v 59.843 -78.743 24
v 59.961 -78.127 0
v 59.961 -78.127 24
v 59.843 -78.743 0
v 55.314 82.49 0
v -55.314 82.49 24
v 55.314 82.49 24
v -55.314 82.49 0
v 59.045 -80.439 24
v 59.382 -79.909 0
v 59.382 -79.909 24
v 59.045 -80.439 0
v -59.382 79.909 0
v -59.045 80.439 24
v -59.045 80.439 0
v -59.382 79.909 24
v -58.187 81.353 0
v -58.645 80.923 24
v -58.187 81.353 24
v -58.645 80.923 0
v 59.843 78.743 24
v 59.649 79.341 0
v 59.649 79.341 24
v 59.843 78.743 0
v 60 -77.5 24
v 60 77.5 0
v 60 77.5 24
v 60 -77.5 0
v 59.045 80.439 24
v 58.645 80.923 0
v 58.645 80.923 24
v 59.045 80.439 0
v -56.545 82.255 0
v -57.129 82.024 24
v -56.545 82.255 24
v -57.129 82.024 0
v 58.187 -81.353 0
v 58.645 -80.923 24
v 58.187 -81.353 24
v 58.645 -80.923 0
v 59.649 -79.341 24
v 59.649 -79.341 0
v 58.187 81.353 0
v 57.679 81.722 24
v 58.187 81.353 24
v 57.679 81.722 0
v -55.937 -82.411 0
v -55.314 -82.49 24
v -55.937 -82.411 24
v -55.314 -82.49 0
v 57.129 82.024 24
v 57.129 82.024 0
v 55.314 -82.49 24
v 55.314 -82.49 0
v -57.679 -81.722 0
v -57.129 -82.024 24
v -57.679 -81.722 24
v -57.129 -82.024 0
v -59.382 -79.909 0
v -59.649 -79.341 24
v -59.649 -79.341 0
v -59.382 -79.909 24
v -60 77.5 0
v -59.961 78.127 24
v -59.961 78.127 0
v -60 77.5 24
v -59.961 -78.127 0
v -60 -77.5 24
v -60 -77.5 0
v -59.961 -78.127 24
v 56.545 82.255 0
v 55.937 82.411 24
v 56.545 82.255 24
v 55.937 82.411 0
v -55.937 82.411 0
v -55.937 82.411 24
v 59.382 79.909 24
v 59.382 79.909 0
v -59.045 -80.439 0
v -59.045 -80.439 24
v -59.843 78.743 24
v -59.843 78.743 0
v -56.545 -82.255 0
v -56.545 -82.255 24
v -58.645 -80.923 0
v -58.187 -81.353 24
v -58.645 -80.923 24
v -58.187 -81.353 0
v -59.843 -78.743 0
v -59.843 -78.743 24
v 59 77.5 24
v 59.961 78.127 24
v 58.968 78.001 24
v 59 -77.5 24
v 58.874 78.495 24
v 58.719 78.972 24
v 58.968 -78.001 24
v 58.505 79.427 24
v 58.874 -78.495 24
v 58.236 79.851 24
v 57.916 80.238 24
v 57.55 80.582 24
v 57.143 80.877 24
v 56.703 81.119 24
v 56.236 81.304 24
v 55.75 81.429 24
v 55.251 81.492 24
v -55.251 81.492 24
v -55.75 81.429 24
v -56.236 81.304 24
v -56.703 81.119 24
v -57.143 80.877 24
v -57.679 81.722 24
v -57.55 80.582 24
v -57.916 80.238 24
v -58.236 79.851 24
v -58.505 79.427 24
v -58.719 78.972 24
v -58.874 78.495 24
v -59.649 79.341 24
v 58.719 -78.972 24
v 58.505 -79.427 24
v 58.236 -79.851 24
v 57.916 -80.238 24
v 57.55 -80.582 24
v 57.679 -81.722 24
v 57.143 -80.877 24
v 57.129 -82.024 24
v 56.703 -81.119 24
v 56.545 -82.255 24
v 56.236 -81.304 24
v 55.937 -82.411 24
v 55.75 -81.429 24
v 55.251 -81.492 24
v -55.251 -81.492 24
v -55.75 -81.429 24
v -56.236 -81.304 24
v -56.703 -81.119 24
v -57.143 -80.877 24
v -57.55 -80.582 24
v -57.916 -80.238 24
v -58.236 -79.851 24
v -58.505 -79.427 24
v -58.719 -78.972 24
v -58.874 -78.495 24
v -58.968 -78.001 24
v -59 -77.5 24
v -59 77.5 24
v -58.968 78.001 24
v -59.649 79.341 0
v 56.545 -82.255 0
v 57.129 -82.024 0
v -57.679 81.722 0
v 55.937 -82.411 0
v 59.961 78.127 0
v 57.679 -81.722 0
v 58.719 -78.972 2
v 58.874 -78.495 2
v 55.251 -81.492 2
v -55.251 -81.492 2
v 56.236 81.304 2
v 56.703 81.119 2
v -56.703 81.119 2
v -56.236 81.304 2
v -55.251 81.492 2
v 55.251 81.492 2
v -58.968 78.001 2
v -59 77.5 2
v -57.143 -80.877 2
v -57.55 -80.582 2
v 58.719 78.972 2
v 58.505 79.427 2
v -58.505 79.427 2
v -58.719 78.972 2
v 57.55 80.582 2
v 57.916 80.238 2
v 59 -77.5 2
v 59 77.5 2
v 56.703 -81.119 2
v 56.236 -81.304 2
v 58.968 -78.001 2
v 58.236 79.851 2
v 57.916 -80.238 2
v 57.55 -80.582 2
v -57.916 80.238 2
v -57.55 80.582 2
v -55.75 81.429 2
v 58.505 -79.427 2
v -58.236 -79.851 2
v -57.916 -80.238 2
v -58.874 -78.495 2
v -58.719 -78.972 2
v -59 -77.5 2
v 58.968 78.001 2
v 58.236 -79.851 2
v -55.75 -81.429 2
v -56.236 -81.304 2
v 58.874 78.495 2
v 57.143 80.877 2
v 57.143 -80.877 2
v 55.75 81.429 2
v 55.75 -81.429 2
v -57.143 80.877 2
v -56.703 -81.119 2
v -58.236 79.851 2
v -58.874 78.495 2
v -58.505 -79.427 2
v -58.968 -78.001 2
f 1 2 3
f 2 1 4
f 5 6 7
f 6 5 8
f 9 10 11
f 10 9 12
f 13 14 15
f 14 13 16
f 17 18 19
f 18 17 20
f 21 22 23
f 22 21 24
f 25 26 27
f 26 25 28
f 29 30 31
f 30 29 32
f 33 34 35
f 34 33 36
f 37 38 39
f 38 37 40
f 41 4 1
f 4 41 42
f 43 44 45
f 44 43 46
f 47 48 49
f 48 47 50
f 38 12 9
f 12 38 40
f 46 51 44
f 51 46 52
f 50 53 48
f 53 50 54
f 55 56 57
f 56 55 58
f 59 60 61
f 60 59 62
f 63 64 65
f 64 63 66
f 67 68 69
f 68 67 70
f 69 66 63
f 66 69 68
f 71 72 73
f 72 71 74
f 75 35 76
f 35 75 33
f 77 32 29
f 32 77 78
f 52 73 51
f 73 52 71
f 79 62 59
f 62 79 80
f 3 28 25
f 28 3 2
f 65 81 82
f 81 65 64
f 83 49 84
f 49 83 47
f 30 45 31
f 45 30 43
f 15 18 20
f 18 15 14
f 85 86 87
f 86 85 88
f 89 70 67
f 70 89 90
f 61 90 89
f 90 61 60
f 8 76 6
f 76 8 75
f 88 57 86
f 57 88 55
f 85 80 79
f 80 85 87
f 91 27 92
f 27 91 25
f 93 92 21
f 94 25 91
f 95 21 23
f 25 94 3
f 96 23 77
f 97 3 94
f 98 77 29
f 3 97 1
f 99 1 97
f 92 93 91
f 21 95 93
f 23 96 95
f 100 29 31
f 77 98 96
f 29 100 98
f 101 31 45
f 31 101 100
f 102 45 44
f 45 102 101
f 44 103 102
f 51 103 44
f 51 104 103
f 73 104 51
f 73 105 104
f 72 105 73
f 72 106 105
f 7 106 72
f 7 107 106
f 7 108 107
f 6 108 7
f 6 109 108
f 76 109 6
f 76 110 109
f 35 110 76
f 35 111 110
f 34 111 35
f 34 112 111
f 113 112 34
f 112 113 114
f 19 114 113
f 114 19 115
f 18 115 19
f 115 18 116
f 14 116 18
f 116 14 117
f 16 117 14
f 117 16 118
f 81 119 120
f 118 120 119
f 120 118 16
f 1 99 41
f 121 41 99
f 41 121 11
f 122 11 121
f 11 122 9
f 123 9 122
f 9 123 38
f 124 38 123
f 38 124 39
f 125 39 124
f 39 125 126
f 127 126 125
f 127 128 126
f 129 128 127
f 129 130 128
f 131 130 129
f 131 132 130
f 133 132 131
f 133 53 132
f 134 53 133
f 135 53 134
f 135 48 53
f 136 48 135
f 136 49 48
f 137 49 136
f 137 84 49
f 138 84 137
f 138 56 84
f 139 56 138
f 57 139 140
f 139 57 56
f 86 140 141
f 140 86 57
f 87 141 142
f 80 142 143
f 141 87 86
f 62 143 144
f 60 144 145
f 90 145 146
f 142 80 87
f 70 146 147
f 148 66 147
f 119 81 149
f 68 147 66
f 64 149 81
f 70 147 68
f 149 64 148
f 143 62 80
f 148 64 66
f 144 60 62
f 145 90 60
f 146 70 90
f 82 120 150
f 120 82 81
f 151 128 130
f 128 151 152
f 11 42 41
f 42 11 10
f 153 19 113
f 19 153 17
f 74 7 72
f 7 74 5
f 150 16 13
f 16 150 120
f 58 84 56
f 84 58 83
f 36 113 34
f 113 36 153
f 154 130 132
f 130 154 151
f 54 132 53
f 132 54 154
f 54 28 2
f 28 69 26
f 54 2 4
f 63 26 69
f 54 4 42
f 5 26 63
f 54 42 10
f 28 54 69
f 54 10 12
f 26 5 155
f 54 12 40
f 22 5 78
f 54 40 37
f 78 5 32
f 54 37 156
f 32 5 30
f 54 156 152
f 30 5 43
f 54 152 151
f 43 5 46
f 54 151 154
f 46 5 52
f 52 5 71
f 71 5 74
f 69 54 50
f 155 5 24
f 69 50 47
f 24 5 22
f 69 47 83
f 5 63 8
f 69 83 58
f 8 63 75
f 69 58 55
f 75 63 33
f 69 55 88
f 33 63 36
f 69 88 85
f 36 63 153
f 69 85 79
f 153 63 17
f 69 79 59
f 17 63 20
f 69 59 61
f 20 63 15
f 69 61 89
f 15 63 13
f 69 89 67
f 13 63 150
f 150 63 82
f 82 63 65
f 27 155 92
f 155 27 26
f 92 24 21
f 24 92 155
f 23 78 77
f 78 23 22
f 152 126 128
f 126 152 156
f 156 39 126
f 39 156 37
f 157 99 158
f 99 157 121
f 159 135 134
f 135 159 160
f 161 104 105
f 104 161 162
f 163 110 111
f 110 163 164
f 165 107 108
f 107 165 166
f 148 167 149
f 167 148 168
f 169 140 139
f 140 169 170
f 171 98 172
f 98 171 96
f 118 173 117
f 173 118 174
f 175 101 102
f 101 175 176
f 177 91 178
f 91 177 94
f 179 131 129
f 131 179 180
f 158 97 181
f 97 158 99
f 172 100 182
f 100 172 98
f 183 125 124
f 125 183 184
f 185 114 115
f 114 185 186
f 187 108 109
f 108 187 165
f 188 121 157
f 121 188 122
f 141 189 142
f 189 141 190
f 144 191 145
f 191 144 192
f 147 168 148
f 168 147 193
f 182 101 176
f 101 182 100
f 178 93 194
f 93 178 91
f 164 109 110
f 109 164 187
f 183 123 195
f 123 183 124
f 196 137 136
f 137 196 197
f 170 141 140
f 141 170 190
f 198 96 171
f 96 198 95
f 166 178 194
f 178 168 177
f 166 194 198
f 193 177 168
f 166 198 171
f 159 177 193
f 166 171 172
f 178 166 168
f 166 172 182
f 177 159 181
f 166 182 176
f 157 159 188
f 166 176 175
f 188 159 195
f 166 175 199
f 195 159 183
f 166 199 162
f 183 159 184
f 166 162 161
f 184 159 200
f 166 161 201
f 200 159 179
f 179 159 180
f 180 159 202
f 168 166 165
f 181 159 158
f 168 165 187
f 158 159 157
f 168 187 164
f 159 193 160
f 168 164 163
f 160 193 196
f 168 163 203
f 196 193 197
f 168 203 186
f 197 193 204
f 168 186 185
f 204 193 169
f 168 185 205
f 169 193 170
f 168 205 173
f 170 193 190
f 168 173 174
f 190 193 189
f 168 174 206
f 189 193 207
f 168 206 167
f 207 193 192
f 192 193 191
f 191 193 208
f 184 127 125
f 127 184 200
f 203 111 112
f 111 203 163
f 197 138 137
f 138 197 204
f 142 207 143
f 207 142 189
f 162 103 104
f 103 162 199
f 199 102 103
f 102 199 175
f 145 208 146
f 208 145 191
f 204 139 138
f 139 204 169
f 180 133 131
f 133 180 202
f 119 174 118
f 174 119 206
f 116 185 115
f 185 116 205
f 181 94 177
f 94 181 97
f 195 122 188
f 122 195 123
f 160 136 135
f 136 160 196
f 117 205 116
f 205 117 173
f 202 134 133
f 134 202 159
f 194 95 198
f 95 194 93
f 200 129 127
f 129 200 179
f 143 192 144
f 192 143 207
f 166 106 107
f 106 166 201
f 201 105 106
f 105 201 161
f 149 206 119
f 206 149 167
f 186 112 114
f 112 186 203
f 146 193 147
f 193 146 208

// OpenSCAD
$fn = 50;


difference() {
	union() {
		hull() {
			translate(v = [-55.0000000000, 77.5000000000, 0]) {
				cylinder(h = 24, r = 5);
			}
			translate(v = [55.0000000000, 77.5000000000, 0]) {
				cylinder(h = 24, r = 5);
			}
			translate(v = [-55.0000000000, -77.5000000000, 0]) {
				cylinder(h = 24, r = 5);
			}
			translate(v = [55.0000000000, -77.5000000000, 0]) {
				cylinder(h = 24, r = 5);
			}
		}
	}
	union() {
		translate(v = [0, 0, 2]) {
			hull() {
				translate(v = [-55.0000000000, 77.5000000000, 0]) {
					cylinder(h = 22, r = 4);
				}
				translate(v = [55.0000000000, 77.5000000000, 0]) {
					cylinder(h = 22, r = 4);
				}
				translate(v = [-55.0000000000, -77.5000000000, 0]) {
					cylinder(h = 22, r = 4);
				}
				translate(v = [55.0000000000, -77.5000000000, 0]) {
					cylinder(h = 22, r = 4);
				}
			}
		}
	}
}
